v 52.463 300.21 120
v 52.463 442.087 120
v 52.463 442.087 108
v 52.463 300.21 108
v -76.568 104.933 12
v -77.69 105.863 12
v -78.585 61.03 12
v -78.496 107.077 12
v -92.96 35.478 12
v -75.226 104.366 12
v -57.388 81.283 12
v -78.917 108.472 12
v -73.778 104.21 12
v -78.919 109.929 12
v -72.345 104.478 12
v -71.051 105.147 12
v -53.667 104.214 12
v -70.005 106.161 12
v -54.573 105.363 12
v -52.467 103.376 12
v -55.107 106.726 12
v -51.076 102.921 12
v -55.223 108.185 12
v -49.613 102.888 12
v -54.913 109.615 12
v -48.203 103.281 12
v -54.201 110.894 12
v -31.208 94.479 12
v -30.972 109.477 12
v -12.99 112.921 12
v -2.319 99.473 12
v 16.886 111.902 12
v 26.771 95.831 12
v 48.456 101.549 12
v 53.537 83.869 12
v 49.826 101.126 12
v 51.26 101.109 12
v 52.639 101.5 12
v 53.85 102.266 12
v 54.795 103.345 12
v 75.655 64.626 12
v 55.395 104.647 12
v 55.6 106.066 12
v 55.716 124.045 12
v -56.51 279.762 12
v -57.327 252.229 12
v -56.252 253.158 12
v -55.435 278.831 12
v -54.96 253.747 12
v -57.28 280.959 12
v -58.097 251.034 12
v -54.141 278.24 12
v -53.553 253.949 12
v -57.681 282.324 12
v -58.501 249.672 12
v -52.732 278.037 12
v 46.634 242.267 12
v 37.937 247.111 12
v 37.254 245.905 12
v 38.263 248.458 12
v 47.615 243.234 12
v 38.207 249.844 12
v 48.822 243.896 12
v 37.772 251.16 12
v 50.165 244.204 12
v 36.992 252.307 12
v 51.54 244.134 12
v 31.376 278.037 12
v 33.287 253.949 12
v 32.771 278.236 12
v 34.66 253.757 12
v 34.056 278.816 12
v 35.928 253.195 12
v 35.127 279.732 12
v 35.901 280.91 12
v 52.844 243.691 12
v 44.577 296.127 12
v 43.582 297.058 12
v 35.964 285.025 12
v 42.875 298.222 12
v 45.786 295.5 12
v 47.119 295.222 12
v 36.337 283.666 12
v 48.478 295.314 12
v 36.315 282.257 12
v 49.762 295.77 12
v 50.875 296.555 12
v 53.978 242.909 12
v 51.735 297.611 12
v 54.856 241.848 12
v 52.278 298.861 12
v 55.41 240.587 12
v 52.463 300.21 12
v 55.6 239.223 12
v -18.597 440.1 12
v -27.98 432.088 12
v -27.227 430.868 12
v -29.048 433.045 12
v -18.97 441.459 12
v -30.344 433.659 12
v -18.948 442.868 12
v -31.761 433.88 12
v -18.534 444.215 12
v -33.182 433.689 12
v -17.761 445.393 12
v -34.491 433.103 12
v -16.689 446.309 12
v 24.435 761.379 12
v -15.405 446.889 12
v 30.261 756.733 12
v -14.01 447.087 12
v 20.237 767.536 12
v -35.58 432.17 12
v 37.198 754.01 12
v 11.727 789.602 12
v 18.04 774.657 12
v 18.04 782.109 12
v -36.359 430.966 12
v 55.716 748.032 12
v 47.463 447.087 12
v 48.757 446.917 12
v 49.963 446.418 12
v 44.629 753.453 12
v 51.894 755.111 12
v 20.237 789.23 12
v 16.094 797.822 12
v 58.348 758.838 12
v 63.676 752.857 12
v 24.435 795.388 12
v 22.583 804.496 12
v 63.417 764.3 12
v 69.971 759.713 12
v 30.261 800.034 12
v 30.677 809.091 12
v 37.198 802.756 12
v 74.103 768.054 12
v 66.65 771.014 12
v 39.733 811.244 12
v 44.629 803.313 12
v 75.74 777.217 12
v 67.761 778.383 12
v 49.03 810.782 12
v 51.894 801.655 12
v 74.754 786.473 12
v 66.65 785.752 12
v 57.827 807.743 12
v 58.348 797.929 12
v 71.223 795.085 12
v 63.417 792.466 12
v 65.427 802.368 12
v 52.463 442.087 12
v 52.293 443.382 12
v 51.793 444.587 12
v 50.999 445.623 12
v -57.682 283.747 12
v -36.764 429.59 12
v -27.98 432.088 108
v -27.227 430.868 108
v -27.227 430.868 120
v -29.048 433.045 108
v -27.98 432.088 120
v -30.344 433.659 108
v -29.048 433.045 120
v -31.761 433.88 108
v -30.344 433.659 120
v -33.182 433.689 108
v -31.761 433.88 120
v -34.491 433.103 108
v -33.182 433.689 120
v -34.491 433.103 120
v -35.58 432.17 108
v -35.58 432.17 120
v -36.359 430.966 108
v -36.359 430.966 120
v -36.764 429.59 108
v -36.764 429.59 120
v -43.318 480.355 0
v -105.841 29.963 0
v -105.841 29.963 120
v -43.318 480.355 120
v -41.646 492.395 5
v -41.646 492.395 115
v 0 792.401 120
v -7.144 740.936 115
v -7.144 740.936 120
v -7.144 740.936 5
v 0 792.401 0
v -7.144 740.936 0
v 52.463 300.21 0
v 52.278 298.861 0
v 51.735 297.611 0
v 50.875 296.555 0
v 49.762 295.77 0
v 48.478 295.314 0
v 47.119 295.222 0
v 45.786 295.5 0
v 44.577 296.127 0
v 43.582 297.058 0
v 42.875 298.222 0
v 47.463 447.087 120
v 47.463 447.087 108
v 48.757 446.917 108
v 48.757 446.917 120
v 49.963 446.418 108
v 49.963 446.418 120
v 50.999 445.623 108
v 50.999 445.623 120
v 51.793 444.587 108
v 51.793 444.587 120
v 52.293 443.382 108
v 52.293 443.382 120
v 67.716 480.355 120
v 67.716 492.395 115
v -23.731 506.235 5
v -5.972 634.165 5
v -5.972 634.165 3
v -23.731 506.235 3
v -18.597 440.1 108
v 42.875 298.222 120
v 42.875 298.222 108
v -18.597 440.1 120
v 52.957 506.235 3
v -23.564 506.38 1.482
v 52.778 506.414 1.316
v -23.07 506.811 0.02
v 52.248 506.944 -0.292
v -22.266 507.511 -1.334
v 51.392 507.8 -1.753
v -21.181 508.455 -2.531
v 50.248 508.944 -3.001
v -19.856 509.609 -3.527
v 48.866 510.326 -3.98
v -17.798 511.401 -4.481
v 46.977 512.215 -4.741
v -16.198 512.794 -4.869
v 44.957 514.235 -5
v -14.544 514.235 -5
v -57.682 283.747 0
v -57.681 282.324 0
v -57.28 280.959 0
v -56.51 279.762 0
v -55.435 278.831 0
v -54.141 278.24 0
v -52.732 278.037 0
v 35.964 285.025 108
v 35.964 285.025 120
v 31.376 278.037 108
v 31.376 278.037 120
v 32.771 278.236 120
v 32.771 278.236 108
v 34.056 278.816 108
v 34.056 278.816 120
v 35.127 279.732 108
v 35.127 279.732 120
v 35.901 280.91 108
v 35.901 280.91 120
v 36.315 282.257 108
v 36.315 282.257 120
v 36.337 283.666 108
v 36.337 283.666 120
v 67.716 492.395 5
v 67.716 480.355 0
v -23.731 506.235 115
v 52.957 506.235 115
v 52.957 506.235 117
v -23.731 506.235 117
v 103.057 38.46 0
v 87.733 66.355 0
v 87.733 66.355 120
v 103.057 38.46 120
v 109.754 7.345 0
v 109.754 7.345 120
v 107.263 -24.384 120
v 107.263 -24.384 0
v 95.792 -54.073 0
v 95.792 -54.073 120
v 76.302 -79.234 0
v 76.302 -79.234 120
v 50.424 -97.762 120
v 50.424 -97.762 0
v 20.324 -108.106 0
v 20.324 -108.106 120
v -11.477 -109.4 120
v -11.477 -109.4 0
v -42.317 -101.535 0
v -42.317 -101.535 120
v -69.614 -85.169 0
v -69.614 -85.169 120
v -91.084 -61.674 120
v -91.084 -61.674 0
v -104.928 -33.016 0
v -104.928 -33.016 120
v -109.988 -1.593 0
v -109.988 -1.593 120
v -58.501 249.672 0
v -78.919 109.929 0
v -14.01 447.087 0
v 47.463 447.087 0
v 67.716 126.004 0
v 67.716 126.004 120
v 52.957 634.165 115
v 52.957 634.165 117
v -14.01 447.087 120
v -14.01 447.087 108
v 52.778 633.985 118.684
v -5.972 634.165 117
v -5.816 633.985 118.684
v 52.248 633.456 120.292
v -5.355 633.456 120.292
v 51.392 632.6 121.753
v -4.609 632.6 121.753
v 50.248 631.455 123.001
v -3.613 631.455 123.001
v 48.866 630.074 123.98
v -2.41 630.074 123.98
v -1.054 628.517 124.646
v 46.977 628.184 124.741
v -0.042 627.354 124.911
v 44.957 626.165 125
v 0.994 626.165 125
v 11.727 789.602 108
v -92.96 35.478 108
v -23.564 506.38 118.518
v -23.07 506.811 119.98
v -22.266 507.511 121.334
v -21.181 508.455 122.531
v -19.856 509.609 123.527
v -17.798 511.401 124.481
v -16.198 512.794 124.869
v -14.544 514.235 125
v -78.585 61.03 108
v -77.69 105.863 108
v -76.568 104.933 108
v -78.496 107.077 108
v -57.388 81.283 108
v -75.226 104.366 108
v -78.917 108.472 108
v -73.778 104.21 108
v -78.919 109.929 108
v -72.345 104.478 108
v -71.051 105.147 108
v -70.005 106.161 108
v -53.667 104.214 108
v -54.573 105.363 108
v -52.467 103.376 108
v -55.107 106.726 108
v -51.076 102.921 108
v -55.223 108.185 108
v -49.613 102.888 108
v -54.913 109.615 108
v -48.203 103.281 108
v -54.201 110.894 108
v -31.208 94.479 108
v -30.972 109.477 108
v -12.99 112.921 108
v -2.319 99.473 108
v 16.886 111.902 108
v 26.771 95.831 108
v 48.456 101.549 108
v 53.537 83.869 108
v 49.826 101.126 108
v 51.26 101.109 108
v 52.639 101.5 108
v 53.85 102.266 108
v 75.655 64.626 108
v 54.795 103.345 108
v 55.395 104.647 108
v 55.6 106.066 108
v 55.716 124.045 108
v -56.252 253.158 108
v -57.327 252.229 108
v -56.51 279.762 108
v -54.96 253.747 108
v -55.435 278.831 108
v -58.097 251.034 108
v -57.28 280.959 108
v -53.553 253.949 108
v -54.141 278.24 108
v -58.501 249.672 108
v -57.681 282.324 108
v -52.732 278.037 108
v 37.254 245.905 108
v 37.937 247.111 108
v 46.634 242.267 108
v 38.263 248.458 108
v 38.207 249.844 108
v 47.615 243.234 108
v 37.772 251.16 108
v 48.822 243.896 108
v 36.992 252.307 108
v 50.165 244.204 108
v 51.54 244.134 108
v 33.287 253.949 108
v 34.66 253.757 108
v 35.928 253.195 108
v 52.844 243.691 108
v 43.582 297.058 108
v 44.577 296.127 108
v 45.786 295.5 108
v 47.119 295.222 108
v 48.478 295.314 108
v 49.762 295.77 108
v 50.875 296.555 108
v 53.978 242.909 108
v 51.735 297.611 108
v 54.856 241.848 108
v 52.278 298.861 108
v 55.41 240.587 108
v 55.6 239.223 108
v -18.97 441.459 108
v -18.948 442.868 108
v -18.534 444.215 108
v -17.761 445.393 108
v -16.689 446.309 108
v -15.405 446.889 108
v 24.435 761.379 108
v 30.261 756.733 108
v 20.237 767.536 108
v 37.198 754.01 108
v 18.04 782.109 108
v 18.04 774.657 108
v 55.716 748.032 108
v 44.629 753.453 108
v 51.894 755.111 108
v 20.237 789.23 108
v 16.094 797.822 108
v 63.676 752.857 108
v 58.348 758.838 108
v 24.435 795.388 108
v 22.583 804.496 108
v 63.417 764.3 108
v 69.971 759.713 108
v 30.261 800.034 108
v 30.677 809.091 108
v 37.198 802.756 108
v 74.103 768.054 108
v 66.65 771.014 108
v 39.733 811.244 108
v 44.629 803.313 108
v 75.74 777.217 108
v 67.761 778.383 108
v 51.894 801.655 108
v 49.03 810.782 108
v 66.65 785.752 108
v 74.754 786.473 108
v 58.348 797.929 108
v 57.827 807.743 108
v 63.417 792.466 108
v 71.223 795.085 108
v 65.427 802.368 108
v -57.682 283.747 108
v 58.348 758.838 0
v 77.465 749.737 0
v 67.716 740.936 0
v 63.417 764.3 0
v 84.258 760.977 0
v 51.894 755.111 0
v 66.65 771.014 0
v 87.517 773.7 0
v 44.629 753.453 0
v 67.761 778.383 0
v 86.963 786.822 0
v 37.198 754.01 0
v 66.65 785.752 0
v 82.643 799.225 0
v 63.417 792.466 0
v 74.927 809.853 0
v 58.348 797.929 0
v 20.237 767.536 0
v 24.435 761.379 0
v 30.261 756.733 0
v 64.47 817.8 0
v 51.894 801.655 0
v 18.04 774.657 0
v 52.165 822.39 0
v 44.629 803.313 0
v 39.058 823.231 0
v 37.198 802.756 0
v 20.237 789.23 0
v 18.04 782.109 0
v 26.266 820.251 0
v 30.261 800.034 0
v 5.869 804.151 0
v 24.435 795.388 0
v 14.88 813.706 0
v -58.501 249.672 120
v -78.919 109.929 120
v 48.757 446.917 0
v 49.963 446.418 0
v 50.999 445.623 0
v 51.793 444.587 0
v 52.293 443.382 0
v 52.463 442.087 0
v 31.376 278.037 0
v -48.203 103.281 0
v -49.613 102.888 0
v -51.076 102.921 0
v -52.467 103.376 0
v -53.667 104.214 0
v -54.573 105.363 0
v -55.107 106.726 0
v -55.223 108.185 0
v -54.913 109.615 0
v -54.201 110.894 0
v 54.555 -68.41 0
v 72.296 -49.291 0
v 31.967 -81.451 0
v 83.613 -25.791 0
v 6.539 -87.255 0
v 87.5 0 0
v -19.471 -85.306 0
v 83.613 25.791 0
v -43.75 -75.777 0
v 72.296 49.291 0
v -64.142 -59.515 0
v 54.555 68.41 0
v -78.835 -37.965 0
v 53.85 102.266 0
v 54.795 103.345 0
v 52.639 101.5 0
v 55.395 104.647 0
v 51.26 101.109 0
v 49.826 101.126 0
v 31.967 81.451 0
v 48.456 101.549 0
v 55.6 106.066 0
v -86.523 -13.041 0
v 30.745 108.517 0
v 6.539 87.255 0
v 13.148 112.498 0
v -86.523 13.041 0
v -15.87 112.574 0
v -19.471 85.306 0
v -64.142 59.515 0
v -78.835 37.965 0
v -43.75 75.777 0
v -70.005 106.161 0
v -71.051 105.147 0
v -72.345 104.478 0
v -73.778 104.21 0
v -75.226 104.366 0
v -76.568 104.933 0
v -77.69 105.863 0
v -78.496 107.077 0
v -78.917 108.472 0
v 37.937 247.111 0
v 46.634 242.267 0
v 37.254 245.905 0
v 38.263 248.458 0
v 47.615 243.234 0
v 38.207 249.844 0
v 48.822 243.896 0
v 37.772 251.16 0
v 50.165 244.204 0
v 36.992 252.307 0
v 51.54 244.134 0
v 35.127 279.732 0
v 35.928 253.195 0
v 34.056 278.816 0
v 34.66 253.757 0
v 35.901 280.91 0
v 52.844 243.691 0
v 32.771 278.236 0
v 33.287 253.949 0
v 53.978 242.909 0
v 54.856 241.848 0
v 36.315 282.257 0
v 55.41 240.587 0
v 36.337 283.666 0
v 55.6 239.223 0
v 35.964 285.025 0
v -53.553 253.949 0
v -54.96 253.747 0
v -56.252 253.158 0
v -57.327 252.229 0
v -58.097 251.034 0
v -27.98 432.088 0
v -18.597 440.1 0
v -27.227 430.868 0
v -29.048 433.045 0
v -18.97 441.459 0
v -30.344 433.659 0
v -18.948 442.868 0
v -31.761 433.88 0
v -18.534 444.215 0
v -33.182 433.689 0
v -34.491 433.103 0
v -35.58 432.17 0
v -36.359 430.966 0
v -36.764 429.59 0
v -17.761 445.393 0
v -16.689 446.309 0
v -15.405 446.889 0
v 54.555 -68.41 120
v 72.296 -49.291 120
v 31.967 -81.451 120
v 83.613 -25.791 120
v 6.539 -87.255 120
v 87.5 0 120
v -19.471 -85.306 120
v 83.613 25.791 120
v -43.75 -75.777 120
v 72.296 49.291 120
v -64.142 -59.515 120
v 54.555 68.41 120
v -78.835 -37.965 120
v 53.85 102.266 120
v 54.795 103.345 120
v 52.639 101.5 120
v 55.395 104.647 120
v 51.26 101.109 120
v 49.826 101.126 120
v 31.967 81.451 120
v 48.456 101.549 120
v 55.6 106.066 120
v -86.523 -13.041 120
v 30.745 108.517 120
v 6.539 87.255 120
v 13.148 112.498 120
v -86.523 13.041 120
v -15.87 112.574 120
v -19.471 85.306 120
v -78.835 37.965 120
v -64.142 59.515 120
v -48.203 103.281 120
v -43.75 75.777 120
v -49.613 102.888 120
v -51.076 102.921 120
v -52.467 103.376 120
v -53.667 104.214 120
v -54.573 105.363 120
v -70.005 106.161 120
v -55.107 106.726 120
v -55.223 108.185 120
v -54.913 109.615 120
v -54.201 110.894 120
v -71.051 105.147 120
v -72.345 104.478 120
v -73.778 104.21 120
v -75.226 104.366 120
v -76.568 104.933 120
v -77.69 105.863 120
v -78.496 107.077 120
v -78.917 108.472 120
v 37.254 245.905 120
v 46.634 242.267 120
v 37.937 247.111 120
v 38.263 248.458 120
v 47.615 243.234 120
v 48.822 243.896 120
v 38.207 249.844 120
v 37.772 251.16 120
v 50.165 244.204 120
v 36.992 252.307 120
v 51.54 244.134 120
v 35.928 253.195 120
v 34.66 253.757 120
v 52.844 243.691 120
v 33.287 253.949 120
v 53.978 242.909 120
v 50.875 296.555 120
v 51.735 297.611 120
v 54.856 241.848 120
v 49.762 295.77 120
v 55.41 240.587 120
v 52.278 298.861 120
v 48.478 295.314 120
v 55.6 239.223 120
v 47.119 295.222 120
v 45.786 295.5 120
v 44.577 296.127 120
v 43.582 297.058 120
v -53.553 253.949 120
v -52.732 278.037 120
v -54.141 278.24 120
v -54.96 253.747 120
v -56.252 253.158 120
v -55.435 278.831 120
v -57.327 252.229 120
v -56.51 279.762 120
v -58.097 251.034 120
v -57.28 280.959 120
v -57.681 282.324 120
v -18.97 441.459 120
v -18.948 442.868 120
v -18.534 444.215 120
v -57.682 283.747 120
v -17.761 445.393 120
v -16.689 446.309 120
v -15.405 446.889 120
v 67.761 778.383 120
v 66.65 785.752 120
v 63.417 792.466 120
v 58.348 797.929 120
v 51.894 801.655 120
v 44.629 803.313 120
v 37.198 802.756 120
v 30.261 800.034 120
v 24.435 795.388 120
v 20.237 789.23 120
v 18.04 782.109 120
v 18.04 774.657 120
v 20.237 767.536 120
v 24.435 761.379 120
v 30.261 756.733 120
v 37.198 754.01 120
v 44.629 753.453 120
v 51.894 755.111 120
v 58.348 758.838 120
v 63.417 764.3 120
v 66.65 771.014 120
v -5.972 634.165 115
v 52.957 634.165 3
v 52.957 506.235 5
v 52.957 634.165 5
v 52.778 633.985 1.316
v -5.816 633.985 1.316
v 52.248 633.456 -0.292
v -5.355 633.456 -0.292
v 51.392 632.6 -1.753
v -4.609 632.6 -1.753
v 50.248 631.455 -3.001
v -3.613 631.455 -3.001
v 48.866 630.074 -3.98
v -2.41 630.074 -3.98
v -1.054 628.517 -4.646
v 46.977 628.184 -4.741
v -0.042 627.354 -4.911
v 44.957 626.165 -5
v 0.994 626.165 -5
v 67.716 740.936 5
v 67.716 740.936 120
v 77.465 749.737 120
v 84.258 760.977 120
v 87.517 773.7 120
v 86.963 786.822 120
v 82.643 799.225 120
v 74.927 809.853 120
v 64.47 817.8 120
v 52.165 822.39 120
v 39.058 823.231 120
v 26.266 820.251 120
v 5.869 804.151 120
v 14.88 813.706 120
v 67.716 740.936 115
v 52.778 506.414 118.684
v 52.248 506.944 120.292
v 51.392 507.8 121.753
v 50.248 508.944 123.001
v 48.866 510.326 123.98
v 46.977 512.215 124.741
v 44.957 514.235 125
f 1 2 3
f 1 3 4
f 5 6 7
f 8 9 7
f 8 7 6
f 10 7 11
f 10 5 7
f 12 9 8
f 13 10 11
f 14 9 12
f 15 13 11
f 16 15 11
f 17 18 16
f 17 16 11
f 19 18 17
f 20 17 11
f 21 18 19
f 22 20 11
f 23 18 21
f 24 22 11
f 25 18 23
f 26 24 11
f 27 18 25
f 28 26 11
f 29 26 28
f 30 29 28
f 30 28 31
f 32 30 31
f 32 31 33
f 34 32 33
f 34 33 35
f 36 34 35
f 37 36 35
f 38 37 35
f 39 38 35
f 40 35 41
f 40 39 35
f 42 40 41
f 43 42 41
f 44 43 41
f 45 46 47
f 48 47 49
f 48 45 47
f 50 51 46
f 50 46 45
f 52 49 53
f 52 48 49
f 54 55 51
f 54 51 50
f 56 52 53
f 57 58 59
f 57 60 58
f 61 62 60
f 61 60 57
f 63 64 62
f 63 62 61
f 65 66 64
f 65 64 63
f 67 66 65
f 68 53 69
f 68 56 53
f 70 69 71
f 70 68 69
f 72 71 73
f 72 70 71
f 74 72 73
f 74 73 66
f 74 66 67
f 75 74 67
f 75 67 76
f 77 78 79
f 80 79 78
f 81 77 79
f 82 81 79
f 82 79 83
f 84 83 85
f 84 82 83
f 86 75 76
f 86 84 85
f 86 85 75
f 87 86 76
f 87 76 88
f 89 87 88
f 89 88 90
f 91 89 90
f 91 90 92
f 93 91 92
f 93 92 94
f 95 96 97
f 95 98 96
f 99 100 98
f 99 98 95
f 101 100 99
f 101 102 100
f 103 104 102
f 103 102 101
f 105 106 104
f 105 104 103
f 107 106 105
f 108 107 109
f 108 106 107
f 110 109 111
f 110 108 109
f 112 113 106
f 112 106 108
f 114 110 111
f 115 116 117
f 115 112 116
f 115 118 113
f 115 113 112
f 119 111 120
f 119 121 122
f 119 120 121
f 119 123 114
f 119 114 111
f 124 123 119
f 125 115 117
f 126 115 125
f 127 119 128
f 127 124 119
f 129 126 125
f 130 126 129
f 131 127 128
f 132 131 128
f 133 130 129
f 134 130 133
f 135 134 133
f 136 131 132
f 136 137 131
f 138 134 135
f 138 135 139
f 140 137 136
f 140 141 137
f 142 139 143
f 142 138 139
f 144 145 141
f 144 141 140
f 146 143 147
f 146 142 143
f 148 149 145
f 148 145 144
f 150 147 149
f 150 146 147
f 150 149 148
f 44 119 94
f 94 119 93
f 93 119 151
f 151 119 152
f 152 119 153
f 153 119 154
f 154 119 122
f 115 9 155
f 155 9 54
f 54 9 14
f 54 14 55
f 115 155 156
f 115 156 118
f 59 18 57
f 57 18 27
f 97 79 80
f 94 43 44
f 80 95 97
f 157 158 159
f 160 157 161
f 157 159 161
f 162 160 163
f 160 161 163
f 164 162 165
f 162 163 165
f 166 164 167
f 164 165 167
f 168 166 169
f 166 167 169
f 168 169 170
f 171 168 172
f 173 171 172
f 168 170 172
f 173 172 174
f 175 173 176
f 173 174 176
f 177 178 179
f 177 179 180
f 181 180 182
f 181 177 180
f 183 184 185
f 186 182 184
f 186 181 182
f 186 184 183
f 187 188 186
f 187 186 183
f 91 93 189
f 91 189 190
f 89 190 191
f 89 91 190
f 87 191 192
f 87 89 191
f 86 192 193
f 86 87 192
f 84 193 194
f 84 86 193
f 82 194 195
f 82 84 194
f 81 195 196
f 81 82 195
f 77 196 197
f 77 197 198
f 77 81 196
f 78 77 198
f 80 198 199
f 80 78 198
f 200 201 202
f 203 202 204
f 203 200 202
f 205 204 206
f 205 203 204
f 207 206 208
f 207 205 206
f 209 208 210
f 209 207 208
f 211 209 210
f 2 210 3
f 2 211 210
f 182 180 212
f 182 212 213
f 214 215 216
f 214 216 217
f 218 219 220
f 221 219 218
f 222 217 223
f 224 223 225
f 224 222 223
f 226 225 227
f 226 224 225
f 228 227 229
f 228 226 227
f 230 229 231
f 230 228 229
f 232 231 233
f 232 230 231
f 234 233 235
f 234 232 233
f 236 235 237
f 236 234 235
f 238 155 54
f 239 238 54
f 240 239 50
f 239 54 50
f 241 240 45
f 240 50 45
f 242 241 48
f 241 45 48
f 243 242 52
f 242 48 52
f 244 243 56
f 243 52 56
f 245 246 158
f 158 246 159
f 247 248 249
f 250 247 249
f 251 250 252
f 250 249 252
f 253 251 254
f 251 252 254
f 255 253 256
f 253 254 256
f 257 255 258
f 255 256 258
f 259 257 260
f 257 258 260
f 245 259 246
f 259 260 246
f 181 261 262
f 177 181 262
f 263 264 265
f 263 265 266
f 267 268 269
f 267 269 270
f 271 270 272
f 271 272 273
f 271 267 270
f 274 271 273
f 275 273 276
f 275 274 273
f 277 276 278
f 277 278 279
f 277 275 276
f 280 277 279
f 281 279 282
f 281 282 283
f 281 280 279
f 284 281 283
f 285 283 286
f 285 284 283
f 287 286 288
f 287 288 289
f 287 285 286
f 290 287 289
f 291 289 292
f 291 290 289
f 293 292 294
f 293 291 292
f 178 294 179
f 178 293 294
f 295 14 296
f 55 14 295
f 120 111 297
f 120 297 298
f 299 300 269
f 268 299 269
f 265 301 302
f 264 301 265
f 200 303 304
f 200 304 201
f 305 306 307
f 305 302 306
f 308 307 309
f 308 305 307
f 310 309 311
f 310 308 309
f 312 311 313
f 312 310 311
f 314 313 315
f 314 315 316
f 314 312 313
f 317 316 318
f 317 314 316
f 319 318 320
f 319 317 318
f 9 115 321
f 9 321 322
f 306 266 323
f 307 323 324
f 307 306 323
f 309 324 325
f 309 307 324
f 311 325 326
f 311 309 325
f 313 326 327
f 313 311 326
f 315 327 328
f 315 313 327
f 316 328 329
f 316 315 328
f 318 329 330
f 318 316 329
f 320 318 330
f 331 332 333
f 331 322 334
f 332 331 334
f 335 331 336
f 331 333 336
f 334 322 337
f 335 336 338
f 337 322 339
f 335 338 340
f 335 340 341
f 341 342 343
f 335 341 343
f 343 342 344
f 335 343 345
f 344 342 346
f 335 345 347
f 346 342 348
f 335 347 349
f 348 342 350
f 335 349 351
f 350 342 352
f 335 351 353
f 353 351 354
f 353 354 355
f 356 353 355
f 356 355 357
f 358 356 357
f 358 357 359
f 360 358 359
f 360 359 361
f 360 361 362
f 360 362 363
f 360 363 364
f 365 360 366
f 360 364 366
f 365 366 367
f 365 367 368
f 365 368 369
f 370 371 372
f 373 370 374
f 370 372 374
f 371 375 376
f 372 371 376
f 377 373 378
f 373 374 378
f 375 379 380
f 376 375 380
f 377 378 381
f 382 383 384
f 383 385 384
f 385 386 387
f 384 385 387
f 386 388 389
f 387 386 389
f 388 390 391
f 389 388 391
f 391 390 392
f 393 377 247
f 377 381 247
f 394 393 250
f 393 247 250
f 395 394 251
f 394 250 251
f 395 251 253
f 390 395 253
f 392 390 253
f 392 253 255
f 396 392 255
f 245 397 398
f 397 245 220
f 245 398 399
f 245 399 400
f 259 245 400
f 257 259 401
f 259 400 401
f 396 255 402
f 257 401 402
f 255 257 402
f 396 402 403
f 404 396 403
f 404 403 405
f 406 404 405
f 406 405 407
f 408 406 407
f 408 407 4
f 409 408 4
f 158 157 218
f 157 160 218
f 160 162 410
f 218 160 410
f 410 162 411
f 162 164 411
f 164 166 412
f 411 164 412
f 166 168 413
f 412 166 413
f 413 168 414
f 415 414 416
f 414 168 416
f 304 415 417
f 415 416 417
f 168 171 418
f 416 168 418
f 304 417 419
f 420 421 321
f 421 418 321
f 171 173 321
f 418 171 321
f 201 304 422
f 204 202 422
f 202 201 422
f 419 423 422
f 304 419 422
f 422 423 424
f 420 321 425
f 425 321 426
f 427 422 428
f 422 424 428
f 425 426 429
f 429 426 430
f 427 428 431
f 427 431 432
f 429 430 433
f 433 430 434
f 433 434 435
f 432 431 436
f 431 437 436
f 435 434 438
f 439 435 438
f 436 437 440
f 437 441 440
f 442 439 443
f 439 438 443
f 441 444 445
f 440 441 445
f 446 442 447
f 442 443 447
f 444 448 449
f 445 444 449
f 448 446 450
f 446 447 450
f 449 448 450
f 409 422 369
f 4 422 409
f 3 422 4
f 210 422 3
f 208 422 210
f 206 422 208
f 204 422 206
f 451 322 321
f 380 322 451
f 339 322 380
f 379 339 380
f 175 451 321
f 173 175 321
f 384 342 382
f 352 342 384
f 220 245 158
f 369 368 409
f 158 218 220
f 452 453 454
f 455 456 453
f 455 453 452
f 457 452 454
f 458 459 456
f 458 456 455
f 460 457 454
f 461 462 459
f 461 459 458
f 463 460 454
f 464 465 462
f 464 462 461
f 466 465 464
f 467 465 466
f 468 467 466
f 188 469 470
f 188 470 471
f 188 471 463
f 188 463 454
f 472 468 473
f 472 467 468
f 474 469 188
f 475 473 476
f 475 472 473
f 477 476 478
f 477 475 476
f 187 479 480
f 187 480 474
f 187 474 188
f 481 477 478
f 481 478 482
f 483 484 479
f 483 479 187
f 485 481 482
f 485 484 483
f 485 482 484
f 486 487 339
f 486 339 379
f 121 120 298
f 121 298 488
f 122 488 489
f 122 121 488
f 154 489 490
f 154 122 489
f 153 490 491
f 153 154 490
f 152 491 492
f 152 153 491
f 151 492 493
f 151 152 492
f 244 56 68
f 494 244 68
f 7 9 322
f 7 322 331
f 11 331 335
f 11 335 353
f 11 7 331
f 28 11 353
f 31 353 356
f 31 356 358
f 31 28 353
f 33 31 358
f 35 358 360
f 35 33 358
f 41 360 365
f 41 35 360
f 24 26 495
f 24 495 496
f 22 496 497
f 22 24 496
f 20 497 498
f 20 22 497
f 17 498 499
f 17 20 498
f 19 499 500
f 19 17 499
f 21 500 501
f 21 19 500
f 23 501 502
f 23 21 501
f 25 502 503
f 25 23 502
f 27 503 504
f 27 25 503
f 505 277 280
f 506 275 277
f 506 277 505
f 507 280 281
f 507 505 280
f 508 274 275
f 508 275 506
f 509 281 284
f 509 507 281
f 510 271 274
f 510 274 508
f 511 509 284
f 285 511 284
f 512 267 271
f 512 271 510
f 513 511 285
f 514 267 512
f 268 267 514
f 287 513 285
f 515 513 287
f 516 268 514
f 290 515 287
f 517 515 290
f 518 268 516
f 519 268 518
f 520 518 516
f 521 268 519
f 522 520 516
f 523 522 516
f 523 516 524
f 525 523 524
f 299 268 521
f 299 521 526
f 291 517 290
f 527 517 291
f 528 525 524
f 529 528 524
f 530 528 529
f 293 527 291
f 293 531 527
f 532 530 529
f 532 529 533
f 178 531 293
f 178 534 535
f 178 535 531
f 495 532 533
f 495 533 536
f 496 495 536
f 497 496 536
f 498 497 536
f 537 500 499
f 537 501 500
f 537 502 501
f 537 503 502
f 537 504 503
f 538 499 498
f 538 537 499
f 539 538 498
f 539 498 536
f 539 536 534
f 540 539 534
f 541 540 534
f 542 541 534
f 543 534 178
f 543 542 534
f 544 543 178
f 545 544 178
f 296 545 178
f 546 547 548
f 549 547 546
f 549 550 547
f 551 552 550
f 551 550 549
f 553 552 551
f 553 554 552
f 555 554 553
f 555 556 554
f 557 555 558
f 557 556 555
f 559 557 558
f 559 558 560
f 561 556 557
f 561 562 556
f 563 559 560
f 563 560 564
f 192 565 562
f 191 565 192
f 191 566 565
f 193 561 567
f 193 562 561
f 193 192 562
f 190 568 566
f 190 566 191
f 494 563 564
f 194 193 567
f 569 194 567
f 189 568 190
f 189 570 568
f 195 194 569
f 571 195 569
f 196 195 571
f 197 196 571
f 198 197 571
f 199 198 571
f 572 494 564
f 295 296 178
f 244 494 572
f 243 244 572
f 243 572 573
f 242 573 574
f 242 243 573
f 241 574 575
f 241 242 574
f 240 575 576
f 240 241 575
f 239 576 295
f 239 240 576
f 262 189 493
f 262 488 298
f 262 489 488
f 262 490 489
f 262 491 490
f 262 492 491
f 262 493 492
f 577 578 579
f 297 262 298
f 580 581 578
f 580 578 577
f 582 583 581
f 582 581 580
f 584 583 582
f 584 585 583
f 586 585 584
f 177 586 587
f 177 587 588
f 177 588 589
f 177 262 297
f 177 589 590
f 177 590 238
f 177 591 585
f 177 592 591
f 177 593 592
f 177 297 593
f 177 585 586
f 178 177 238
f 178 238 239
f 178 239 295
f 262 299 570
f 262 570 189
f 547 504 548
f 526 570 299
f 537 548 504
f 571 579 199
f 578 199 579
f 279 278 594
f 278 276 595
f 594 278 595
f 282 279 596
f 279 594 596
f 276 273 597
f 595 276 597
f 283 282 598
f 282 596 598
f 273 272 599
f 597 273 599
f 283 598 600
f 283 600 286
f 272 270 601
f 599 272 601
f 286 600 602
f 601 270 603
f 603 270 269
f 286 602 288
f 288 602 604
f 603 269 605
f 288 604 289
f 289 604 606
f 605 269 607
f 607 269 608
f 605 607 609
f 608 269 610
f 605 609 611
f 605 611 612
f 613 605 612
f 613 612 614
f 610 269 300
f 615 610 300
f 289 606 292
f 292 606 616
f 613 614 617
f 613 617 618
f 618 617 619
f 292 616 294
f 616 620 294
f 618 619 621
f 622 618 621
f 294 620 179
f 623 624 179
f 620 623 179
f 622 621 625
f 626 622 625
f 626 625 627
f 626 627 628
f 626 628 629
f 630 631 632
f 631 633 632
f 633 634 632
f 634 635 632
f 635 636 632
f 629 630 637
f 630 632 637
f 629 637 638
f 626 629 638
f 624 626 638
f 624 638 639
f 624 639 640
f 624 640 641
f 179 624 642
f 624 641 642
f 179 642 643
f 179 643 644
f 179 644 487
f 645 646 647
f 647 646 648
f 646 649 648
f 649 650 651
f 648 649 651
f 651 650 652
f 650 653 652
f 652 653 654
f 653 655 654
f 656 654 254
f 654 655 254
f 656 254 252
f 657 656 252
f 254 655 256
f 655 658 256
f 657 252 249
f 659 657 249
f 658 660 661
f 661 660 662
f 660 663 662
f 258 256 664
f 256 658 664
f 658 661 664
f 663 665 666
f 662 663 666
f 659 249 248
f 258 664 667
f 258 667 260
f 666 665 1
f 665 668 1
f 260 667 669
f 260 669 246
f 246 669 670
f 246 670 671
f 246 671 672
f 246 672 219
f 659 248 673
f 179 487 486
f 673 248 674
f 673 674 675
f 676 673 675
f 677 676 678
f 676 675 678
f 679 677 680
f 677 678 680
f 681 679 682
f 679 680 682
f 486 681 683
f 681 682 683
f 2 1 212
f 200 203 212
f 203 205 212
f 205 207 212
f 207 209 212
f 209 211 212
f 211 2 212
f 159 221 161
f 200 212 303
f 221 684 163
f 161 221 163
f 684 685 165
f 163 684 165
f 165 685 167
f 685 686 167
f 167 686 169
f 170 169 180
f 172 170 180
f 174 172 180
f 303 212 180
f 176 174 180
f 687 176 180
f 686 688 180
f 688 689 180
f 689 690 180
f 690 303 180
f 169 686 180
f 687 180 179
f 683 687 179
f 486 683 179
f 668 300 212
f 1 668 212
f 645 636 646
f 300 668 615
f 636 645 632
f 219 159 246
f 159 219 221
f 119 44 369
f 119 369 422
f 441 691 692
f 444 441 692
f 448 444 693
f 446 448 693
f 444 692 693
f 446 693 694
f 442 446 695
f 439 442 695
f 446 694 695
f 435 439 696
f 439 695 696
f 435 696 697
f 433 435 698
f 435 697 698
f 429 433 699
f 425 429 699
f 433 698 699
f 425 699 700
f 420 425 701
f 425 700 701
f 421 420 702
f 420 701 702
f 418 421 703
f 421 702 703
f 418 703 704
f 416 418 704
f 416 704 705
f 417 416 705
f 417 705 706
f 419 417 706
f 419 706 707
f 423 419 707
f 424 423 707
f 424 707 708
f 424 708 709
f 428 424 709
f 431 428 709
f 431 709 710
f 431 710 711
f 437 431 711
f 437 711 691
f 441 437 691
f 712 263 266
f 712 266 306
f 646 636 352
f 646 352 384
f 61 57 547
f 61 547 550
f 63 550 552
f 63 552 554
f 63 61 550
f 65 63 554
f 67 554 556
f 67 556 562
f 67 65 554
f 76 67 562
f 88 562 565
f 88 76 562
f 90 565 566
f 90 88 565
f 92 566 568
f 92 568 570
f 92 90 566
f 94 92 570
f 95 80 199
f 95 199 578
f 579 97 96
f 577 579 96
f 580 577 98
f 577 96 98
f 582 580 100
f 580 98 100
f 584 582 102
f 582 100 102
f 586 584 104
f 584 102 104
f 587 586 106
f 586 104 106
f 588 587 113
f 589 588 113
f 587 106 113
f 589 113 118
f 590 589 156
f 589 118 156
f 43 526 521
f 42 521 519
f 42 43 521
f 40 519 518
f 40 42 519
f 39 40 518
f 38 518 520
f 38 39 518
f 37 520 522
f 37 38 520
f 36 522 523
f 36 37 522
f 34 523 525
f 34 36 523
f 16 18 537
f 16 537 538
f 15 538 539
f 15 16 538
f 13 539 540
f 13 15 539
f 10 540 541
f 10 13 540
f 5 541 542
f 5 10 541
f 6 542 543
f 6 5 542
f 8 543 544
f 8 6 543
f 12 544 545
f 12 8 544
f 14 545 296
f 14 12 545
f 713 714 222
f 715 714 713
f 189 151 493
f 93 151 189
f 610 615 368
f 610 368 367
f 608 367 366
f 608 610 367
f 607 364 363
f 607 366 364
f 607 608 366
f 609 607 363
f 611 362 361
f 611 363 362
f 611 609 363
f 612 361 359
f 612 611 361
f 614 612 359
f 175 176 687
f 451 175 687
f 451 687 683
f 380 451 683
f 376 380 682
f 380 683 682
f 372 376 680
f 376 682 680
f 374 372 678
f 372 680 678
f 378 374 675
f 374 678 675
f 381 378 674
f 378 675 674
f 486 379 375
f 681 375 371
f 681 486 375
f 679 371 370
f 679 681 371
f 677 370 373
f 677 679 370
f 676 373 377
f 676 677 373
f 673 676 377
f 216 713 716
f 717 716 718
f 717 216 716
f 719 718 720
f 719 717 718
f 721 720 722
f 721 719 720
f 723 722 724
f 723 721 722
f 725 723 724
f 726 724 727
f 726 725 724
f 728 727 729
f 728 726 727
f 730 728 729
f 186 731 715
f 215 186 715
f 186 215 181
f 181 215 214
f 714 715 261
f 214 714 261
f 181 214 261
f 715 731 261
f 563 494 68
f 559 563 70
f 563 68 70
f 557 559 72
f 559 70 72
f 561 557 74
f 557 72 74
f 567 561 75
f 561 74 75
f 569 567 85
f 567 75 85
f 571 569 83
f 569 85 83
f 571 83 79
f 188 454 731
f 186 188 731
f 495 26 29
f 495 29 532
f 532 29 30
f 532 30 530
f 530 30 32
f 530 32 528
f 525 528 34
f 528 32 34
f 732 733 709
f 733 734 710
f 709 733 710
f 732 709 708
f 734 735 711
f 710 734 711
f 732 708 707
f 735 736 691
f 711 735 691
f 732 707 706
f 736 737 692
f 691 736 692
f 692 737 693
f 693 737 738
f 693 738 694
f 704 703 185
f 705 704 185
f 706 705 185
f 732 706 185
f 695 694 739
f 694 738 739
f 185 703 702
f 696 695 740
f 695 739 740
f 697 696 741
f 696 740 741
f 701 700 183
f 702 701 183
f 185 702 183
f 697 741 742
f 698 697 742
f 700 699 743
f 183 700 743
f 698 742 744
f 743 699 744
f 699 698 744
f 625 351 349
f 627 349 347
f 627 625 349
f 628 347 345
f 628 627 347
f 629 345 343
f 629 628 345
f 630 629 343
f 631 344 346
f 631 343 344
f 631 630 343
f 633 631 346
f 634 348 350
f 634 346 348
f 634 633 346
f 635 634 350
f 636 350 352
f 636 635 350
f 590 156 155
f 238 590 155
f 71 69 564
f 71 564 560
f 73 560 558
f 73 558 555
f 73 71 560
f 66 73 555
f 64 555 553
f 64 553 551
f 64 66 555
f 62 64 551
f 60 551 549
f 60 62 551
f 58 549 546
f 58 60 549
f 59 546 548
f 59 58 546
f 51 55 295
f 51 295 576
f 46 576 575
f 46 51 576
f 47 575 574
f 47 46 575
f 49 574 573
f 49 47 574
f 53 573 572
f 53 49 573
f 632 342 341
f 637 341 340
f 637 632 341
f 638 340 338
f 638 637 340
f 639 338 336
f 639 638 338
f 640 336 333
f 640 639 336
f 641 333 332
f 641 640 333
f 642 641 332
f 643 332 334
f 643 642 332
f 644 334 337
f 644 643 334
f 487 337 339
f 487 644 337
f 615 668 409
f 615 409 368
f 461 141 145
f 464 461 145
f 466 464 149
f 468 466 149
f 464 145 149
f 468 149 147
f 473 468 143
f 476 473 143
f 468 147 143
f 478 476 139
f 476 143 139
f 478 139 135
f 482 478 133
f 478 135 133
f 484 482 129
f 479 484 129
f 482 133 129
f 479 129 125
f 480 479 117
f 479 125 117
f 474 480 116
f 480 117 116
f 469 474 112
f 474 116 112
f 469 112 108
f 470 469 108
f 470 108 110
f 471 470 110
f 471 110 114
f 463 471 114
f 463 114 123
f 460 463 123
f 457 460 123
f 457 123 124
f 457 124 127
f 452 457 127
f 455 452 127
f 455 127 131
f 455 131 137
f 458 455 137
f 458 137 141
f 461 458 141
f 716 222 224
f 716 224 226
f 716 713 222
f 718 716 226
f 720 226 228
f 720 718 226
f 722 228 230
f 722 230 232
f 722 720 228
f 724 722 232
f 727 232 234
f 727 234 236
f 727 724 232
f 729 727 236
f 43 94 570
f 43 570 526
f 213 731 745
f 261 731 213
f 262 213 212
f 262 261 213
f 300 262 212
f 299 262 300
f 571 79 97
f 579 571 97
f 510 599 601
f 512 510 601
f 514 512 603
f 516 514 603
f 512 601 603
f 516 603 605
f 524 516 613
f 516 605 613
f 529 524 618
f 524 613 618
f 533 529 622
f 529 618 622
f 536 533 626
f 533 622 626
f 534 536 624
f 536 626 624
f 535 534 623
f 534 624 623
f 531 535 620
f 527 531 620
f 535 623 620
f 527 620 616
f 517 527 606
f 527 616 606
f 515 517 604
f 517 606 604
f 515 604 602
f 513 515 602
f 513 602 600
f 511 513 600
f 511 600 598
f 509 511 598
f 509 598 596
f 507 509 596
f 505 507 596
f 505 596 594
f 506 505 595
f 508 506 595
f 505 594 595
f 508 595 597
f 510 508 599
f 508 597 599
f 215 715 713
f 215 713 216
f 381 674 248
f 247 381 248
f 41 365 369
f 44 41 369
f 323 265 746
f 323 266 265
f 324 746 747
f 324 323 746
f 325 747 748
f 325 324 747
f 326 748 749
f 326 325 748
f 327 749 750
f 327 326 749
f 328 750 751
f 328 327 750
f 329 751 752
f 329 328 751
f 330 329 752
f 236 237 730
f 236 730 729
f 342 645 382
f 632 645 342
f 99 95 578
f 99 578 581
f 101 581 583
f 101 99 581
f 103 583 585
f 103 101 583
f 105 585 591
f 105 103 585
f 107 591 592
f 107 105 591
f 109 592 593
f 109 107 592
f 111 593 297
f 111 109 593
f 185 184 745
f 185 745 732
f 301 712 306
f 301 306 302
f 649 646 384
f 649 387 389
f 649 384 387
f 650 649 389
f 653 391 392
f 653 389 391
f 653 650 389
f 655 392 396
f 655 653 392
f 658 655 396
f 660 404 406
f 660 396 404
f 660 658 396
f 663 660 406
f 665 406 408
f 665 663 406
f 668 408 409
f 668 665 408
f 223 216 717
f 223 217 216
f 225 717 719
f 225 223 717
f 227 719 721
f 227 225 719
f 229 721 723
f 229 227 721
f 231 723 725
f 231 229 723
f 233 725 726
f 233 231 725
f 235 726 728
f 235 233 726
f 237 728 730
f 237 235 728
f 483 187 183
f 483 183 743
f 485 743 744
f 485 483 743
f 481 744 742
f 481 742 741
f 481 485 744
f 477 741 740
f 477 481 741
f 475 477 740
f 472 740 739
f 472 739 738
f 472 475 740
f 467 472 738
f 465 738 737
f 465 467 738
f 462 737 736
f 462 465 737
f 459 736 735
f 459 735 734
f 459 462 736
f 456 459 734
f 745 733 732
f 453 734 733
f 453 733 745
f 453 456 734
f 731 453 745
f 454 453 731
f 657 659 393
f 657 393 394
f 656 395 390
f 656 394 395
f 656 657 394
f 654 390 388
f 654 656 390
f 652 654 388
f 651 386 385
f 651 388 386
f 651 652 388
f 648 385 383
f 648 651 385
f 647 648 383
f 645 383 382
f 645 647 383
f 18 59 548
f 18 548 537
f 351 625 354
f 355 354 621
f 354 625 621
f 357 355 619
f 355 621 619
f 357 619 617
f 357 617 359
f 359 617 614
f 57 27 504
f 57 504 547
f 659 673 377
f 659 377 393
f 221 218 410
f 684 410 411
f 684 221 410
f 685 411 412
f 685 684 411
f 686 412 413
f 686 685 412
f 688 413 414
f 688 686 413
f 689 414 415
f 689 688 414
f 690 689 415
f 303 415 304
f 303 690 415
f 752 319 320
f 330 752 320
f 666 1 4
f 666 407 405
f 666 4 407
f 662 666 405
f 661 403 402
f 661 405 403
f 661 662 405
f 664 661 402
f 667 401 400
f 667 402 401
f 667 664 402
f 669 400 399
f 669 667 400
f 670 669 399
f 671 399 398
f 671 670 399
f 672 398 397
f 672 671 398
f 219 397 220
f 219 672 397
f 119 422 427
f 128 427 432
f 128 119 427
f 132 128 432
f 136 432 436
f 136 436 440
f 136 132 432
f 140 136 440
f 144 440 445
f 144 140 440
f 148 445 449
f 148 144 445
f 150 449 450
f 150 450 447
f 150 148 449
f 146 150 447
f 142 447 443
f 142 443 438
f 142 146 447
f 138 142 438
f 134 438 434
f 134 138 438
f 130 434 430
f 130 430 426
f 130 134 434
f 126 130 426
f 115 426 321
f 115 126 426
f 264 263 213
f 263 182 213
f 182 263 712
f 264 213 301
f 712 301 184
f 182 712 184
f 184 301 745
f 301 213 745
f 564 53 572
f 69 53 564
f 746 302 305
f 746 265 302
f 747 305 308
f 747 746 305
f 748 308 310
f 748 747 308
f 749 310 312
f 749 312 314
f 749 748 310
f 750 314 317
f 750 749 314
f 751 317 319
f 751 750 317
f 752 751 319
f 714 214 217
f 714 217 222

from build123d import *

# Parameters (mm, degrees)
BOSS_EXTRUDE1_DEPTH = 120
SKETCH2_R           = 87.5
CUT_EXTRUDE1_DEPTH  = 120
SKETCH3_R           = 25
CUT_EXTRUDE2_DEPTH  = 120
SHELL2_START        = 12
SHELL2_OUTLINE_R    = 25
SHELL2_DEPTH        = 96
CUT_EXTRUDE4_DEPTH  = 120
CUT_EXTRUDE5_DEPTH  = 120
BOSS_EXTRUDE2_DEPTH = 10
BOSS_EXTRUDE3_DEPTH = 10
FILLET1_R           = 8


# Read off the part's stored shape, not the designer's step: Shell2
with BuildPart() as part:
    # Sketch1 → Boss-Extrude1 (new body)
    with BuildSketch(Plane.XY):
        with BuildLine():
            Line((-105.840625, 29.962678445), (0, 792.401413426))
            ThreePointArc((0, 792.401413426), (69.989991069, 814.210311801), (67.715560492, 740.936483843))
            Line((67.715560492, 740.936483843), (67.715560492, 126.004465834))
            Line((67.715560492, 126.004465834), (87.732689968, 66.35491776))
            ThreePointArc((87.732689968, 66.35491776), (20.324199821, -108.106090955), (-105.840625, 29.962678445))
        make_face()
    extrude(amount=BOSS_EXTRUDE1_DEPTH)

    # Sketch2 → Cut-Extrude1 (cut)
    with BuildSketch(Plane.XY.offset(120)):
        Circle(SKETCH2_R)
    extrude(amount=-CUT_EXTRUDE1_DEPTH, mode=Mode.SUBTRACT)

    # Sketch3 → Cut-Extrude2 (cut)
    with BuildSketch(Plane.XY.offset(120)):
        with Locations((42.760873913, 778.383294358)):
            Circle(SKETCH3_R)
    extrude(amount=-CUT_EXTRUDE2_DEPTH, mode=Mode.SUBTRACT)

    # Shell2 outline → Shell2 (cut)
    with BuildSketch(Plane.XY.offset(SHELL2_START)):
        with BuildLine():
            Line((75.655144686, 64.626225966), (55.715560492, 124.0446949))
            Line((55.715560492, 124.0446949), (55.715560492, 748.032411411))
            ThreePointArc((55.715560492, 748.032411411), (65.426599219, 802.367974809), (11.726520361, 789.602425324))
            Line((11.726520361, 789.602425324), (-92.959881421, 35.478309517))
            ThreePointArc((-92.959881421, 35.478309517), (-16.948856501, 98.045837562), (75.655144686, 64.626225966))
        make_face()
        with Locations((42.760873913, 778.383294358)):
            Circle(SHELL2_OUTLINE_R, mode=Mode.SUBTRACT)
    extrude(amount=SHELL2_DEPTH, mode=Mode.SUBTRACT)

    # Sketch4 → Cut-Extrude4 (cut)
    with BuildSketch(Plane.XY.offset(120)):
        with BuildLine():
            Line((-54.201038132, 110.893822017), (46.63374807, 242.267143469))
            ThreePointArc((46.63374807, 242.267143469), (52.207619727, 243.957335897), (55.600099295, 239.222794941))
            Line((55.600099295, 239.222794941), (55.600099295, 106.065561115))
            ThreePointArc((55.600099295, 106.065561115), (53.272224451, 101.839481708), (48.456200434, 101.548515878))
            add(Edge.make_bspline(
                [(-48.203411652, 103.280674868), (-32.29772345, 110.352299936), (0.49057596, 117.216976021), (32.14071495, 109.29223969), (48.456200434, 101.548515878)],
                knots=[0.164763499, 0.164763499, 0.164763499, 0.164763499, 0.551333425, 0.942878972, 0.942878972, 0.942878972, 0.942878972], degree=3))
            ThreePointArc((-48.203411652, 103.280674868), (-54.162298411, 104.755306741), (-54.201038132, 110.893822017))
        make_face()
        with BuildLine():
            Line((-53.553065242, 253.949018208), (33.287473267, 253.949018208))
            ThreePointArc((33.287473267, 253.949018208), (37.771987881, 251.160155626), (37.253824493, 245.90466968))
            Line((37.253824493, 245.90466968), (-70.005272034, 106.161389635))
            ThreePointArc((-70.005272034, 106.161389635), (-75.918077174, 104.600163589), (-78.919089143, 109.928636031))
            Line((-78.919089143, 109.928636031), (-58.500531126, 249.671916076))
            ThreePointArc((-58.500531126, 249.671916076), (-56.823043121, 252.731510068), (-53.553065242, 253.949018208))
        make_face()
        with BuildLine():
            Line((-52.732234928, 278.037445865), (31.376208078, 278.037445865))
            ThreePointArc((31.376208078, 278.037445865), (35.555871549, 280.293286019), (35.964073946, 285.02528056))
            Line((35.964073946, 285.02528056), (-27.226737743, 430.86787452))
            ThreePointArc((-27.226737743, 430.86787452), (-32.478658579, 433.835746738), (-36.76395609, 429.589906043))
            Line((-36.76395609, 429.589906043), (-57.681587406, 283.747312082))
            ThreePointArc((-57.681587406, 283.747312082), (-56.510417764, 279.762490223), (-52.732234928, 278.037445865))
        make_face()
        with BuildLine():
            Line((-14.009585394, 447.087418489), (47.46310653, 447.087418489))
            ThreePointArc((47.46310653, 447.087418489), (50.998640436, 445.622952394), (52.46310653, 442.087418489))
            Line((52.46310653, 442.087418489), (52.46310653, 300.210196021))
            ThreePointArc((52.46310653, 300.210196021), (48.478160878, 295.314313601), (42.875240662, 298.222361327))
            Line((42.875240662, 298.222361327), (-18.597451263, 440.099583794))
            ThreePointArc((-18.597451263, 440.099583794), (-18.189248866, 444.831578335), (-14.009585394, 447.087418489))
        make_face()
    extrude(amount=-CUT_EXTRUDE4_DEPTH, mode=Mode.SUBTRACT)

    # Sketch6 → Cut-Extrude5 (cut)
    with BuildSketch(Plane(origin=(67.715560492, 0, 0), x_dir=(0, 0, -1), z_dir=(1, 0, 0))):
        Polygon((-120, 480.355293397), (-115, 492.394948365), (-115, 740.936483843), (-120, 740.936483843), align=None)
        Polygon((0, 740.936483843), (-5, 740.936483843), (-5, 492.394948365), (0, 480.355293397), align=None)
    extrude(amount=-CUT_EXTRUDE5_DEPTH, mode=Mode.SUBTRACT)

    # Sketch9 → Boss-Extrude2 (add)
    with BuildSketch(Plane(origin=(0, 0, 5), x_dir=(-1, 0, 0), z_dir=(0, 0, -1))):
        Polygon((-52.957009084, 634.164562087), (5.972067956, 634.164562087), (23.731094104, 506.234767355), (-52.957009084, 506.234767355), align=None)
    extrude(amount=BOSS_EXTRUDE2_DEPTH)

    # Sketch7 → Boss-Extrude3 (add)
    with BuildSketch(Plane.XY.offset(115)):
        Polygon((-5.972067956, 634.164562087), (52.957009084, 634.164562087), (52.957009084, 506.234767355), (-23.731094104, 506.234767355), align=None)
    extrude(amount=BOSS_EXTRUDE3_DEPTH)

    # Fillet1
    fillet1_edges = [part.edges().sort_by_distance(p)[0] for p in [
        (52.957009084, 570.199664721, -5),
        (14.61295749, 506.234767355, -5),
        (-14.85158103, 570.199664721, -5),
        (23.492470564, 634.164562087, -5),
        (-14.85158103, 570.199664721, 125),
        (14.61295749, 506.234767355, 125),
        (52.957009084, 570.199664721, 125),
        (23.492470564, 634.164562087, 125),
    ]]
    fillet(fillet1_edges, radius=FILLET1_R)


solid = part.part
